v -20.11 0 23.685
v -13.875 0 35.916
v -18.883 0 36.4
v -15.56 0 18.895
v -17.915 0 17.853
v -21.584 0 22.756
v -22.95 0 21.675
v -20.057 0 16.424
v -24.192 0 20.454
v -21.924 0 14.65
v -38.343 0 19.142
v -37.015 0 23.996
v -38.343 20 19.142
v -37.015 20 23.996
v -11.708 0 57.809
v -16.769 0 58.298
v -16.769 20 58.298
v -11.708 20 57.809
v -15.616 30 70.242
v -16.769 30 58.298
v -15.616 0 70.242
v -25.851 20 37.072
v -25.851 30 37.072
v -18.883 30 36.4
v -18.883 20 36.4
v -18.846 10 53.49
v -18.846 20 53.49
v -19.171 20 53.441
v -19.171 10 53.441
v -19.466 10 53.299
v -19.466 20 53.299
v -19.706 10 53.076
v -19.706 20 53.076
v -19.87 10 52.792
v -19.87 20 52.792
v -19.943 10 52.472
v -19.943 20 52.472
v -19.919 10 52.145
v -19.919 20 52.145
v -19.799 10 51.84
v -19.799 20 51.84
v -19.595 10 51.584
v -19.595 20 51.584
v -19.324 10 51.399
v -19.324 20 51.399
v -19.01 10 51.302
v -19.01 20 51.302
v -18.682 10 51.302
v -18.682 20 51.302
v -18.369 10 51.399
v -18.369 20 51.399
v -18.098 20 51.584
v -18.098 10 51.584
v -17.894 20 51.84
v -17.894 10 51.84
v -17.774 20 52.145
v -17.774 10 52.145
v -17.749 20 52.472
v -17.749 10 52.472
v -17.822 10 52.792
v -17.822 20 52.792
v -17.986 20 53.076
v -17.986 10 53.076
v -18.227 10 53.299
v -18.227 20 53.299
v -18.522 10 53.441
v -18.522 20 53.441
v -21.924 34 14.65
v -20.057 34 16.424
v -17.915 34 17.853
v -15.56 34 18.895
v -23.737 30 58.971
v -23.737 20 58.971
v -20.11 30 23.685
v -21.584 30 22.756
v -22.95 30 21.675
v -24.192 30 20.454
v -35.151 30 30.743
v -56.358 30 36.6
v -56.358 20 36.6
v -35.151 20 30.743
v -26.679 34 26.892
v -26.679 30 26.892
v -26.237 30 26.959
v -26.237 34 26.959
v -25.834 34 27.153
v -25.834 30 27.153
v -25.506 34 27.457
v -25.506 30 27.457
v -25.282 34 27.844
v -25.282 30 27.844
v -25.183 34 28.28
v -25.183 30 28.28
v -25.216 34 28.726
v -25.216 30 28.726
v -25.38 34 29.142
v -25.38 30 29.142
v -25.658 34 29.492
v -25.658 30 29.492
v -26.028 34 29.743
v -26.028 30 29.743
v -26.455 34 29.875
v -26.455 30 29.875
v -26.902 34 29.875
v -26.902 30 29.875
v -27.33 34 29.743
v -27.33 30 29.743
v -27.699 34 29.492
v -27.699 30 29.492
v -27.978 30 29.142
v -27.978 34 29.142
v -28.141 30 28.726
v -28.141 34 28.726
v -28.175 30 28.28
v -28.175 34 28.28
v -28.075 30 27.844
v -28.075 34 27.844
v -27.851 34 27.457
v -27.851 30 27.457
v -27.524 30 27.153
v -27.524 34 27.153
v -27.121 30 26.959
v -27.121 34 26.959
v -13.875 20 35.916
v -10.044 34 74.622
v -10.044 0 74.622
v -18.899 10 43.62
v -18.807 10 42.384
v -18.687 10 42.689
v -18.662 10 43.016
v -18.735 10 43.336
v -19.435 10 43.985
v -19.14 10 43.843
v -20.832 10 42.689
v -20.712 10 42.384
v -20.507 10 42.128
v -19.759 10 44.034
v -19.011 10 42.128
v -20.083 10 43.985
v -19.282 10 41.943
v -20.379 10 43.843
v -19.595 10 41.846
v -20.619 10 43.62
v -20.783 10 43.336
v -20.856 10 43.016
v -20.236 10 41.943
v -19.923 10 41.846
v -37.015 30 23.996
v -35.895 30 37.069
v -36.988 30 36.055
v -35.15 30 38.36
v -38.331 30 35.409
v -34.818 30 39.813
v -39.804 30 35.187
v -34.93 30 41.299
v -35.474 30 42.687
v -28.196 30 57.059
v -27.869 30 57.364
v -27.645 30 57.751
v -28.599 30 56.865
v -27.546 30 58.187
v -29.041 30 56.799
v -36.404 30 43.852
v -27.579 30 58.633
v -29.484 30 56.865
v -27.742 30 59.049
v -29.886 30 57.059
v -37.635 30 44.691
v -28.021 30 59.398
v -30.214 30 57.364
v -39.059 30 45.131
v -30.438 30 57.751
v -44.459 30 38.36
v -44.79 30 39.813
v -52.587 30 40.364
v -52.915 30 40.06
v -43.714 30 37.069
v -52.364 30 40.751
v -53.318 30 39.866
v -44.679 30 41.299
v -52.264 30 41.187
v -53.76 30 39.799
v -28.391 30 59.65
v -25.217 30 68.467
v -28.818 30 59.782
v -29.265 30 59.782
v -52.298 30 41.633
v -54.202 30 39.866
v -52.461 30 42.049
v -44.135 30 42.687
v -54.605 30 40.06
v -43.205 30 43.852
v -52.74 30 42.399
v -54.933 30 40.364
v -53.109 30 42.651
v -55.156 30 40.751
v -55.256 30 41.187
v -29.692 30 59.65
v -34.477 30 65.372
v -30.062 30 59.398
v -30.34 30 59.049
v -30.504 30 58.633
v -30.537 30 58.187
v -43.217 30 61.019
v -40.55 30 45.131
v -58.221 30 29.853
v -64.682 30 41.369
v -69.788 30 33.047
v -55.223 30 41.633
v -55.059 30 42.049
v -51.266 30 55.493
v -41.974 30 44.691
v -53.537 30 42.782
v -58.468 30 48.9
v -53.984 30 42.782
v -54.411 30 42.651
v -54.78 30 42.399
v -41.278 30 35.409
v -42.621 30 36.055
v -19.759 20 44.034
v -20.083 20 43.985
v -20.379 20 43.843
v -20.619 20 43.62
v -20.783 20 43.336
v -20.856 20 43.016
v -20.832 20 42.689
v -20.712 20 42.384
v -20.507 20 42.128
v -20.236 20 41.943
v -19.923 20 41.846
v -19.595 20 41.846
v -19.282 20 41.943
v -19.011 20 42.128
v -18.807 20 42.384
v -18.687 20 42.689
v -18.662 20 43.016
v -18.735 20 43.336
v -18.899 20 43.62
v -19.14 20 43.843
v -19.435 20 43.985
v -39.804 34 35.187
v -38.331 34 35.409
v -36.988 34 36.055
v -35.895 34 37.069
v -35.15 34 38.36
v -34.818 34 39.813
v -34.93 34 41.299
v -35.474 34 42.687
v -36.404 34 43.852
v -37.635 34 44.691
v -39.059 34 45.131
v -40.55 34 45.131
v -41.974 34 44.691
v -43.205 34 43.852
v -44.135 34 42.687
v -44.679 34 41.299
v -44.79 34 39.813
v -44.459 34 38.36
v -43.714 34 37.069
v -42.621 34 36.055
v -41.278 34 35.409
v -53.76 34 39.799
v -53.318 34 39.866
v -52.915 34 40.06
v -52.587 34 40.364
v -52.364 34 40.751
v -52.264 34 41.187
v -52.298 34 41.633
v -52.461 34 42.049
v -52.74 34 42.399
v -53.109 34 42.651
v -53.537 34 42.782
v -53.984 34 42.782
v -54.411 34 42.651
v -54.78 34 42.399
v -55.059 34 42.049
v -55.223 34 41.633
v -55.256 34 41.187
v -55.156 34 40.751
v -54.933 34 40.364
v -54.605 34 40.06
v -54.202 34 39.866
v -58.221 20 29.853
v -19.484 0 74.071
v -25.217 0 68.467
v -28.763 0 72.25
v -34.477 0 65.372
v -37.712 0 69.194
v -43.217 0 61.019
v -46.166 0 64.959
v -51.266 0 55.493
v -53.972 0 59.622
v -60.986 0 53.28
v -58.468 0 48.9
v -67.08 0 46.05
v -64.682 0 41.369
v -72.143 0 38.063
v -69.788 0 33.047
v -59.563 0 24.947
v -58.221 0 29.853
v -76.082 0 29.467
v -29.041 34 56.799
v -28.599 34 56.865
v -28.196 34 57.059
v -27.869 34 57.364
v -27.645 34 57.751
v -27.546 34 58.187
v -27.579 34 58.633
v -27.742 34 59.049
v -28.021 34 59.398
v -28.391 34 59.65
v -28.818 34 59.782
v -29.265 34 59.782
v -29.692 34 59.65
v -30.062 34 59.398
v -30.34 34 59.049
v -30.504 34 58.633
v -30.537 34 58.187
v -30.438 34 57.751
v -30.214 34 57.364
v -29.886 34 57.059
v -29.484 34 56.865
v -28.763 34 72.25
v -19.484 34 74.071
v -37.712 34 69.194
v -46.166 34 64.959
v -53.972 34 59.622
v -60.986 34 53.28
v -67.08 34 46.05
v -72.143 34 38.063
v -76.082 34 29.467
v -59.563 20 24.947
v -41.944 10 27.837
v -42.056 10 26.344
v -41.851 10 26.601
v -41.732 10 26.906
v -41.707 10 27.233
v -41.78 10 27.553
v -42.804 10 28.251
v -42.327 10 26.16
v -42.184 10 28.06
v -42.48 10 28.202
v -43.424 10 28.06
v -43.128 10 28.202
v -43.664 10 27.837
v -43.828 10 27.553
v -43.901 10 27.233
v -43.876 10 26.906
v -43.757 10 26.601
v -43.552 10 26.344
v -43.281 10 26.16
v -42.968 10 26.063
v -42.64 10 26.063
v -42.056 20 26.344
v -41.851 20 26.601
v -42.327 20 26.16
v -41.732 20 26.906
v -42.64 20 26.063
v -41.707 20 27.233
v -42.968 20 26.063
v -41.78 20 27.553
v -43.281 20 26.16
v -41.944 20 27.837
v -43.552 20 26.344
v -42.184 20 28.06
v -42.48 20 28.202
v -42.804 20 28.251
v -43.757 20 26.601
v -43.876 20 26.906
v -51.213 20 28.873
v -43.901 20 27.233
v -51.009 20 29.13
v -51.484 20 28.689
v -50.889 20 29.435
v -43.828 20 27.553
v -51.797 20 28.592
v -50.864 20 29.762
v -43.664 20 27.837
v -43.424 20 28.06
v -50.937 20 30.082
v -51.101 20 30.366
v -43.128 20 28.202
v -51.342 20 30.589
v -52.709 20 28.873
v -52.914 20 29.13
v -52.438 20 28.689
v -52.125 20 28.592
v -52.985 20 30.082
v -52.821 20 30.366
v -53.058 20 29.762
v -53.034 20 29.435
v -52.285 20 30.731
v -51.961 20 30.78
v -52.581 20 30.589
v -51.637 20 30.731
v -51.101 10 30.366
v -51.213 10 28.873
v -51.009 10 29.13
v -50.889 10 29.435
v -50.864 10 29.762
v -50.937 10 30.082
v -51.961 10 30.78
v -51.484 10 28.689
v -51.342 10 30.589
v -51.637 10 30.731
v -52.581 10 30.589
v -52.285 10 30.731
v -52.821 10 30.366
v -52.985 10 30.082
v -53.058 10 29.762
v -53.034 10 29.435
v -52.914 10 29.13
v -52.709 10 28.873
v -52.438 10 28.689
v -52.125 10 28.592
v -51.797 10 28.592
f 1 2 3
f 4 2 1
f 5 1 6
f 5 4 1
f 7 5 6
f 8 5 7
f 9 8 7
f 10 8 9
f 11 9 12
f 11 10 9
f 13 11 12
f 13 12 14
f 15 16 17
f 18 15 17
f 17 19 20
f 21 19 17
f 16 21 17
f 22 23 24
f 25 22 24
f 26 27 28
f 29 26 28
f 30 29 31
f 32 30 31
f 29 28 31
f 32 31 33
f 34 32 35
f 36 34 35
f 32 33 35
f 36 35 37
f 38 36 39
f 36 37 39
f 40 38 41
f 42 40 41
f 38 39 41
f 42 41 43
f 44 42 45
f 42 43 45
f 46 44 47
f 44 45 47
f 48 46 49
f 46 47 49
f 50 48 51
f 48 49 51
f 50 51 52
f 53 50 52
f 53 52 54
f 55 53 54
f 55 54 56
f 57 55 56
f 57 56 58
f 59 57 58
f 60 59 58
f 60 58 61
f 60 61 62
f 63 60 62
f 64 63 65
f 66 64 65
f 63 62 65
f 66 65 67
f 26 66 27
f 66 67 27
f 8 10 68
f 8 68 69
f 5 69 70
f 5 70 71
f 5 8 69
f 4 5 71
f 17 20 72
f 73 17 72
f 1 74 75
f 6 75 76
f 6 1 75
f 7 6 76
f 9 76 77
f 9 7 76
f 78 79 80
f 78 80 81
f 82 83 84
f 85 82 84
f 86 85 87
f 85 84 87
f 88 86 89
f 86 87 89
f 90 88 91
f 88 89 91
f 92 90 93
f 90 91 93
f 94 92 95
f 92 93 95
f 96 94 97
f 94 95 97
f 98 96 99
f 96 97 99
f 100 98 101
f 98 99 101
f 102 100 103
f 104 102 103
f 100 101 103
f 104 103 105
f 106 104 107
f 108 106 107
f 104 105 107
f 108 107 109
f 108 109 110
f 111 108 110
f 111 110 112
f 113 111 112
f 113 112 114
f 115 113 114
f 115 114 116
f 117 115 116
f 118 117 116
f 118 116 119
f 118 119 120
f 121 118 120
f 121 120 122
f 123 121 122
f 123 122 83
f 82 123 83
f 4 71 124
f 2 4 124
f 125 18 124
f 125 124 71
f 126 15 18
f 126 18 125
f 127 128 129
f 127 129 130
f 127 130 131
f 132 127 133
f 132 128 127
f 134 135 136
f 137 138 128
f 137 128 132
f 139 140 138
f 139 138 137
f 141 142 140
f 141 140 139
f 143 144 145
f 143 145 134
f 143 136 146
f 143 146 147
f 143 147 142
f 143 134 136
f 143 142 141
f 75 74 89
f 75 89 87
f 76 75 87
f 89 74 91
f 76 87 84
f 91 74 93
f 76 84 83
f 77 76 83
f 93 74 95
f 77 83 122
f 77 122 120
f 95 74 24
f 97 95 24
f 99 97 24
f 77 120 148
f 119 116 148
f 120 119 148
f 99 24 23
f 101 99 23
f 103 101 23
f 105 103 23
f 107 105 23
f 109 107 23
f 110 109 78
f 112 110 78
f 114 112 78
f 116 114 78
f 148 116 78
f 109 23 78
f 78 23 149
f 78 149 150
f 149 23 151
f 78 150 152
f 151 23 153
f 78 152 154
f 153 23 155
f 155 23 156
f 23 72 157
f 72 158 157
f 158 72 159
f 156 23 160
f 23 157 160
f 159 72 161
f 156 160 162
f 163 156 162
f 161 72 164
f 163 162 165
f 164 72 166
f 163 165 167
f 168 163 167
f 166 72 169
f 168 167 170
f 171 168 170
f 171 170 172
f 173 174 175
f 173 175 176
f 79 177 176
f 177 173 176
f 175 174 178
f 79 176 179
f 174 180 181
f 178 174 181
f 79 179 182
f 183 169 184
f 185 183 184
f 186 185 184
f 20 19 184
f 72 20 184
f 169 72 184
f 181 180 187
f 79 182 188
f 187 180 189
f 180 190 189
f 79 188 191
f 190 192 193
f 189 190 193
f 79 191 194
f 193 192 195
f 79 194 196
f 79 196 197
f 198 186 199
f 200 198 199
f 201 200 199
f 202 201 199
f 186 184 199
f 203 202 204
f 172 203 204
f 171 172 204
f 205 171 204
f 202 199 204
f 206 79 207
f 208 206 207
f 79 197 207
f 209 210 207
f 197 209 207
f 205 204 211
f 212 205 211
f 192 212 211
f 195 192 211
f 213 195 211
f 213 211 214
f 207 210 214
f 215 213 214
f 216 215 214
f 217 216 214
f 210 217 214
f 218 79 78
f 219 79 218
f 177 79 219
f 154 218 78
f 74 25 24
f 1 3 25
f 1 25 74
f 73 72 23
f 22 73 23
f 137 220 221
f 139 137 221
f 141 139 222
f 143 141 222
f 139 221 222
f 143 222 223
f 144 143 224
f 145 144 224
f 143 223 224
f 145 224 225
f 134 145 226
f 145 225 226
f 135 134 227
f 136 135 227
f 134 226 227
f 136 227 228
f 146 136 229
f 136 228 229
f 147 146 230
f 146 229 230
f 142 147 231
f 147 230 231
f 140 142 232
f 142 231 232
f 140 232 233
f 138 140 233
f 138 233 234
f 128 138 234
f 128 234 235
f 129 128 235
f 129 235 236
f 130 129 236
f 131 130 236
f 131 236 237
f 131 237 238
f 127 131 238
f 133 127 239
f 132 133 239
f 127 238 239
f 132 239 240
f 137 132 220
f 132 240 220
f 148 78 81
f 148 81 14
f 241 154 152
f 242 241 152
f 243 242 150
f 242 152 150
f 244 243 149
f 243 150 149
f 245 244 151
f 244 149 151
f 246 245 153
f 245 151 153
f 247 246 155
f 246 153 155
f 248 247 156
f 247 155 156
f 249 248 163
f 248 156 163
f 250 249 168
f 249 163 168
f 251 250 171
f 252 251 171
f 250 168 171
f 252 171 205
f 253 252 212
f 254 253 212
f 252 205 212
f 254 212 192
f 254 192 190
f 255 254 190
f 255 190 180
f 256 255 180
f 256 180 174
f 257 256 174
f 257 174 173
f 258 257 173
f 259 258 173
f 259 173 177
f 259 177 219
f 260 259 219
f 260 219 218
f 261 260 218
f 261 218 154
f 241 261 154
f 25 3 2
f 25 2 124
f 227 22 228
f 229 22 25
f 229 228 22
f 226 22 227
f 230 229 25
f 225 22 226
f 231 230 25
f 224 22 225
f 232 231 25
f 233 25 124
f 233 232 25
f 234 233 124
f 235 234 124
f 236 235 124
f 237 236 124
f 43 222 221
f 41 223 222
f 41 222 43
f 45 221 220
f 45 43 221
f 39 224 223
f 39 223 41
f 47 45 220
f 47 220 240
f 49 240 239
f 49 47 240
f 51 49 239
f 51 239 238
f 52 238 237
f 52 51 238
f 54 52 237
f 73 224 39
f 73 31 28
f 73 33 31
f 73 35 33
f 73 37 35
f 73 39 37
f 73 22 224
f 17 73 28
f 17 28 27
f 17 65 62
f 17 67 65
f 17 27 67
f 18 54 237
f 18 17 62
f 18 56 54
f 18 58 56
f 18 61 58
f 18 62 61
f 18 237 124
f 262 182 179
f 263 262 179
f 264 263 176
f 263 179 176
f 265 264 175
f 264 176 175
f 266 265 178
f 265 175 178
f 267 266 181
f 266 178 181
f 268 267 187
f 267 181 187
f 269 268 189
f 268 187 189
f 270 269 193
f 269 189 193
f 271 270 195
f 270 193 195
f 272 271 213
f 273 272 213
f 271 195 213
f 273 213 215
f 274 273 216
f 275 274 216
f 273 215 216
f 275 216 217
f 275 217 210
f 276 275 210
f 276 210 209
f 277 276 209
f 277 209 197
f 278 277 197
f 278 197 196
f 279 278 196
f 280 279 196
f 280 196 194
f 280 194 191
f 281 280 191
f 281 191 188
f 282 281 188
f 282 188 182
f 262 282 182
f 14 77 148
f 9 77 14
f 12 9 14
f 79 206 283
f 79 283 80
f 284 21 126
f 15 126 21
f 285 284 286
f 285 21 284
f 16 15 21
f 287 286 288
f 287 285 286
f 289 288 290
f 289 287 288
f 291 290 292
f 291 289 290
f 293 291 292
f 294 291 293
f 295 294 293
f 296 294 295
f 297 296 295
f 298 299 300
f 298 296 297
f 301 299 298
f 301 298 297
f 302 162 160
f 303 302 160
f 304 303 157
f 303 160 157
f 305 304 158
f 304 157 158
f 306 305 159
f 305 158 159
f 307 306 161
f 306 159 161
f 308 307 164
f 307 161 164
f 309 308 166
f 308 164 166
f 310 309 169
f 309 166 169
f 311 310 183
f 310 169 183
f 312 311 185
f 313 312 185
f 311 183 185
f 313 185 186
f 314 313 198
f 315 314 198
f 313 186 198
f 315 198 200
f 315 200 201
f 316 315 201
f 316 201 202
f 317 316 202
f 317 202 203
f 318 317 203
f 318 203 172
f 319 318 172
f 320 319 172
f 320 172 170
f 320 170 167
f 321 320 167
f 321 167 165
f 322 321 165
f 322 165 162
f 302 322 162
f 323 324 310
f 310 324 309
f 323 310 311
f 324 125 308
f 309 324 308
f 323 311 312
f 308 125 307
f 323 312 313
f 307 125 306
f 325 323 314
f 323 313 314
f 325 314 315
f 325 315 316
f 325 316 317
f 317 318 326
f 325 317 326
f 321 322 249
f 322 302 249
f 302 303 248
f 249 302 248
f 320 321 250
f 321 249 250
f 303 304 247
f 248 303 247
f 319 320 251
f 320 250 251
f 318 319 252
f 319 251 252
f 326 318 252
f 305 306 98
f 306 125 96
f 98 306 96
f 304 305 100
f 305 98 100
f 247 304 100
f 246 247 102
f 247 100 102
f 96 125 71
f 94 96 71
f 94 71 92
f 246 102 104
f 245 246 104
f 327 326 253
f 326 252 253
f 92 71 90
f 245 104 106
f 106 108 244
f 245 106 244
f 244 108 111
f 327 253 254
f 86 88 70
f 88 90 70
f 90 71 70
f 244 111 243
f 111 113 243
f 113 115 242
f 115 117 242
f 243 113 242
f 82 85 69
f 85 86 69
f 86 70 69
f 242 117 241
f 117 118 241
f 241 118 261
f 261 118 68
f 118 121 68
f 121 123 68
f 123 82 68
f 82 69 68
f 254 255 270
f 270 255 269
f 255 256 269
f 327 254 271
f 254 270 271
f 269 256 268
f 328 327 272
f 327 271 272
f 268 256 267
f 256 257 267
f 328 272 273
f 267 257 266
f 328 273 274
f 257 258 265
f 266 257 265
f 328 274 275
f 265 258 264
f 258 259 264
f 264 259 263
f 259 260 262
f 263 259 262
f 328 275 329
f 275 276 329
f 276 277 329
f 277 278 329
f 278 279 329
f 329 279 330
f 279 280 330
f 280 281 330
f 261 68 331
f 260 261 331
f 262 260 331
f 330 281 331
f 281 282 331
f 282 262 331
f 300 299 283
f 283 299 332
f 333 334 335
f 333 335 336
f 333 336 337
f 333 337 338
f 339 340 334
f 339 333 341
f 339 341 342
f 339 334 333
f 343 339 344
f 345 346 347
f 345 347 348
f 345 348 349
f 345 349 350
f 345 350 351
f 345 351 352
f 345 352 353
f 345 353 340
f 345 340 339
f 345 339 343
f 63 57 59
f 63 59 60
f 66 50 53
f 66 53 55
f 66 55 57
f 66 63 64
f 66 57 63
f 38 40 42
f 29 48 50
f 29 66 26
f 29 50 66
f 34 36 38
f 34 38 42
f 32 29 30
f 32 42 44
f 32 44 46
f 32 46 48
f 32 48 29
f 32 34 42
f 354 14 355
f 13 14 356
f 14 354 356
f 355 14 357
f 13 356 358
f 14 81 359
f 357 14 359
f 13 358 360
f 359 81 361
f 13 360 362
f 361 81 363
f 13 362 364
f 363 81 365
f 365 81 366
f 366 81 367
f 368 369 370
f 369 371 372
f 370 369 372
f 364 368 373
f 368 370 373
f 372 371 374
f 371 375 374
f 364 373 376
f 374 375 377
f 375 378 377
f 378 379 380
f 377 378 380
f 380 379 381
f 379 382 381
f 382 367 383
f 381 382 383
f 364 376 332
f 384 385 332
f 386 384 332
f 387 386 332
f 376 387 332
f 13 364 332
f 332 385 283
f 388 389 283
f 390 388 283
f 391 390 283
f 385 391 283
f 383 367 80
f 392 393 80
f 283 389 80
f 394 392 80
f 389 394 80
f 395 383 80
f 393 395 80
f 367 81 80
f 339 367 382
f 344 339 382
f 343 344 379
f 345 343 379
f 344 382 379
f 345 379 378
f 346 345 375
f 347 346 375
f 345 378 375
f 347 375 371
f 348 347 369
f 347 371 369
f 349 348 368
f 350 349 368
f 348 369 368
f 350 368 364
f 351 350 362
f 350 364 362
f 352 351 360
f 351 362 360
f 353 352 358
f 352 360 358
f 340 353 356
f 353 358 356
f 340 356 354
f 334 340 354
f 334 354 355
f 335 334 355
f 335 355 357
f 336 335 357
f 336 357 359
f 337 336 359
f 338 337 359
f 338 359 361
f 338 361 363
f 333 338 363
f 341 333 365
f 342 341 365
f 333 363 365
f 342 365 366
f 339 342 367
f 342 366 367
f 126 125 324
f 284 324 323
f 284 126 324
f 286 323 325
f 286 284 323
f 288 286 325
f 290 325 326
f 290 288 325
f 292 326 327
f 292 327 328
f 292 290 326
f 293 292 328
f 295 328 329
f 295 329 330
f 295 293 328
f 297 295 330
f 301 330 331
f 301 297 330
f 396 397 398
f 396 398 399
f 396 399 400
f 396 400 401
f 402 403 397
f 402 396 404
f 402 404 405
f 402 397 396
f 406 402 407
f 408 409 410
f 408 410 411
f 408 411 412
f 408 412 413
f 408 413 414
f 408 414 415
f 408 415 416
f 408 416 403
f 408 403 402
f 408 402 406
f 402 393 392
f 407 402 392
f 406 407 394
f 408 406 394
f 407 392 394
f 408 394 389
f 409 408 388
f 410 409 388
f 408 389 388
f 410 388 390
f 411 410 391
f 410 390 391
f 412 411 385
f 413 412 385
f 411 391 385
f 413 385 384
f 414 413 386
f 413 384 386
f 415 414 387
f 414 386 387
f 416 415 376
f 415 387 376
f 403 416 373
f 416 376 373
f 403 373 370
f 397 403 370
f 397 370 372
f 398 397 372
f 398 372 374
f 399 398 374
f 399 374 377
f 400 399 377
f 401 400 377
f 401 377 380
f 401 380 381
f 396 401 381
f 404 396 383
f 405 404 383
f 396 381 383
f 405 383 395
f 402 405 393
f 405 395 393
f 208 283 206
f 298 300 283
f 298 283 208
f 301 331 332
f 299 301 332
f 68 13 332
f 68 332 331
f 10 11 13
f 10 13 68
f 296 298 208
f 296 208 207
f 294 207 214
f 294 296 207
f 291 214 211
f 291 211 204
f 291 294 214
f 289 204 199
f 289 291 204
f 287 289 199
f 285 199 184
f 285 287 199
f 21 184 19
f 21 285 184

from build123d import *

# Parameters (mm, degrees)
BOSS_EXTRUDE1_DEPTH = 34
CUT_EXTRUDE1_DEPTH  = 30
SKETCH3_R           = 1.5
SKETCH3_R_2         = 5
CUT_EXTRUDE2_DEPTH  = 5
SKETCH4_W           = 22
SKETCH4_H           = 20
CUT_EXTRUDE3_DEPTH  = 6
SKETCH5_W           = 22
SKETCH5_H           = 20
CUT_EXTRUDE4_DEPTH  = 6
BOSS_EXTRUDE2_DEPTH = 10
SKETCH13_R          = 1.1
BOSS_EXTRUDE3_DEPTH = 10


with BuildPart() as part:
    # Sketch1 → Boss-Extrude1 (new body)
    with BuildSketch(Plane(origin=(0, 0, 0), x_dir=(1, 0, 0), z_dir=(0, 1, 0))):
        with BuildLine():
            Line((-76.081577676, -29.466634021), (-21.923666814, -14.650090384))
            ThreePointArc((-21.923666814, -14.650090384), (-19.017028504, -17.184879238), (-15.560151539, -18.894762991))
            Line((-15.560151539, -18.894762991), (-10.044056272, -74.622428409))
            ThreePointArc((-10.044056272, -74.622428409), (-50.159082361, -62.422374938), (-76.081577676, -29.466634021))
        make_face()
    extrude(amount=BOSS_EXTRUDE1_DEPTH)

    # Sketch2 → Cut-Extrude1 (cut)
    with BuildSketch(Plane.XZ):
        with BuildLine():
            Line((-15.616008473, 70.242360983), (-20.11040821, 23.685256516))
            ThreePointArc((-20.11040821, 23.685256516), (-22.281207254, 22.23411959), (-24.191874091, 20.454367051))
            Line((-24.191874091, 20.454367051), (-69.788119019, 33.047125828))
            ThreePointArc((-69.788119019, 33.047125828), (-47.337872486, 58.396456158), (-15.616008473, 70.242360983))
        make_face()
    extrude(amount=-CUT_EXTRUDE1_DEPTH, mode=Mode.SUBTRACT)

    # Sketch3 → Cut-Extrude2 (cut)
    with BuildSketch(Plane.XZ.offset(-30)):
        with Locations(Location((-26.678732616, 28.39195825, 0), (0, 0, 270))):
            Circle(SKETCH3_R)
        with Locations(Location((-53.760144922, 41.299208442, 0), (0, 0, 270))):
            Circle(SKETCH3_R)
        with Locations(Location((-29.04143221, 58.298774373, 0), (0, 0, 270))):
            Circle(SKETCH3_R)
        with Locations(Location((-39.804422608, 40.186637237, 0), (0, 0, 270))):
            Circle(SKETCH3_R_2)
    extrude(amount=-CUT_EXTRUDE2_DEPTH, mode=Mode.SUBTRACT)

    # Sketch4 → Cut-Extrude3 (cut)
    with BuildSketch(Plane(origin=(-22.190078988, 0, 2.142123878), x_dir=(0.09608851901557673, 0, 0.9953727927331515), z_dir=(-0.9953727927331515, 0, 0.09608851901557673))):
        with Locations((45.416815893, 10)):
            Rectangle(SKETCH4_W, SKETCH4_H)
    extrude(amount=-CUT_EXTRUDE3_DEPTH, mode=Mode.SUBTRACT)

    # Sketch5 → Cut-Extrude4 (cut)
    with BuildSketch(Plane(origin=(2.202244009, 0, 8.049713729), x_dir=(-0.9645546270217643, 0, 0.26388325352493547), z_dir=(-0.26388325352493547, 0, -0.9645546270217643))):
        with Locations((53.035036195, 10)):
            Rectangle(SKETCH5_W, SKETCH5_H)
    extrude(amount=-CUT_EXTRUDE4_DEPTH, mode=Mode.SUBTRACT)

    # Sketch10 → Boss-Extrude2 (add)
    with BuildSketch(Plane.XZ.offset(-30)):
        Polygon((-18.88301812, 36.399686031), (-16.769070701, 58.297887471), (-23.73668025, 58.970507104), (-25.850627669, 37.072305664), align=None)
        Polygon((-37.014944581, 23.995839242), (-58.221116276, 29.852554092), (-56.357621539, 36.599952655), (-35.151449843, 30.743237805), align=None)
    extrude(amount=BOSS_EXTRUDE2_DEPTH)

    # Sketch13 → Boss-Extrude3 (add)
    with BuildSketch(Plane.XZ.offset(-20)):
        with Locations(Location((-51.961198367, 29.679846926, 0), (0, 0, 90))):
            Circle(SKETCH13_R)
        with Locations(Location((-42.804014603, 27.150818354, 0), (0, 0, 90))):
            Circle(SKETCH13_R)
        with Locations(Location((-18.846348086, 52.390153669, 0), (0, 0, 90))):
            Circle(SKETCH13_R)
        with Locations(Location((-19.759189017, 42.934112138, 0), (0, 0, 90))):
            Circle(SKETCH13_R)
    extrude(amount=BOSS_EXTRUDE3_DEPTH)


solid = part.part
